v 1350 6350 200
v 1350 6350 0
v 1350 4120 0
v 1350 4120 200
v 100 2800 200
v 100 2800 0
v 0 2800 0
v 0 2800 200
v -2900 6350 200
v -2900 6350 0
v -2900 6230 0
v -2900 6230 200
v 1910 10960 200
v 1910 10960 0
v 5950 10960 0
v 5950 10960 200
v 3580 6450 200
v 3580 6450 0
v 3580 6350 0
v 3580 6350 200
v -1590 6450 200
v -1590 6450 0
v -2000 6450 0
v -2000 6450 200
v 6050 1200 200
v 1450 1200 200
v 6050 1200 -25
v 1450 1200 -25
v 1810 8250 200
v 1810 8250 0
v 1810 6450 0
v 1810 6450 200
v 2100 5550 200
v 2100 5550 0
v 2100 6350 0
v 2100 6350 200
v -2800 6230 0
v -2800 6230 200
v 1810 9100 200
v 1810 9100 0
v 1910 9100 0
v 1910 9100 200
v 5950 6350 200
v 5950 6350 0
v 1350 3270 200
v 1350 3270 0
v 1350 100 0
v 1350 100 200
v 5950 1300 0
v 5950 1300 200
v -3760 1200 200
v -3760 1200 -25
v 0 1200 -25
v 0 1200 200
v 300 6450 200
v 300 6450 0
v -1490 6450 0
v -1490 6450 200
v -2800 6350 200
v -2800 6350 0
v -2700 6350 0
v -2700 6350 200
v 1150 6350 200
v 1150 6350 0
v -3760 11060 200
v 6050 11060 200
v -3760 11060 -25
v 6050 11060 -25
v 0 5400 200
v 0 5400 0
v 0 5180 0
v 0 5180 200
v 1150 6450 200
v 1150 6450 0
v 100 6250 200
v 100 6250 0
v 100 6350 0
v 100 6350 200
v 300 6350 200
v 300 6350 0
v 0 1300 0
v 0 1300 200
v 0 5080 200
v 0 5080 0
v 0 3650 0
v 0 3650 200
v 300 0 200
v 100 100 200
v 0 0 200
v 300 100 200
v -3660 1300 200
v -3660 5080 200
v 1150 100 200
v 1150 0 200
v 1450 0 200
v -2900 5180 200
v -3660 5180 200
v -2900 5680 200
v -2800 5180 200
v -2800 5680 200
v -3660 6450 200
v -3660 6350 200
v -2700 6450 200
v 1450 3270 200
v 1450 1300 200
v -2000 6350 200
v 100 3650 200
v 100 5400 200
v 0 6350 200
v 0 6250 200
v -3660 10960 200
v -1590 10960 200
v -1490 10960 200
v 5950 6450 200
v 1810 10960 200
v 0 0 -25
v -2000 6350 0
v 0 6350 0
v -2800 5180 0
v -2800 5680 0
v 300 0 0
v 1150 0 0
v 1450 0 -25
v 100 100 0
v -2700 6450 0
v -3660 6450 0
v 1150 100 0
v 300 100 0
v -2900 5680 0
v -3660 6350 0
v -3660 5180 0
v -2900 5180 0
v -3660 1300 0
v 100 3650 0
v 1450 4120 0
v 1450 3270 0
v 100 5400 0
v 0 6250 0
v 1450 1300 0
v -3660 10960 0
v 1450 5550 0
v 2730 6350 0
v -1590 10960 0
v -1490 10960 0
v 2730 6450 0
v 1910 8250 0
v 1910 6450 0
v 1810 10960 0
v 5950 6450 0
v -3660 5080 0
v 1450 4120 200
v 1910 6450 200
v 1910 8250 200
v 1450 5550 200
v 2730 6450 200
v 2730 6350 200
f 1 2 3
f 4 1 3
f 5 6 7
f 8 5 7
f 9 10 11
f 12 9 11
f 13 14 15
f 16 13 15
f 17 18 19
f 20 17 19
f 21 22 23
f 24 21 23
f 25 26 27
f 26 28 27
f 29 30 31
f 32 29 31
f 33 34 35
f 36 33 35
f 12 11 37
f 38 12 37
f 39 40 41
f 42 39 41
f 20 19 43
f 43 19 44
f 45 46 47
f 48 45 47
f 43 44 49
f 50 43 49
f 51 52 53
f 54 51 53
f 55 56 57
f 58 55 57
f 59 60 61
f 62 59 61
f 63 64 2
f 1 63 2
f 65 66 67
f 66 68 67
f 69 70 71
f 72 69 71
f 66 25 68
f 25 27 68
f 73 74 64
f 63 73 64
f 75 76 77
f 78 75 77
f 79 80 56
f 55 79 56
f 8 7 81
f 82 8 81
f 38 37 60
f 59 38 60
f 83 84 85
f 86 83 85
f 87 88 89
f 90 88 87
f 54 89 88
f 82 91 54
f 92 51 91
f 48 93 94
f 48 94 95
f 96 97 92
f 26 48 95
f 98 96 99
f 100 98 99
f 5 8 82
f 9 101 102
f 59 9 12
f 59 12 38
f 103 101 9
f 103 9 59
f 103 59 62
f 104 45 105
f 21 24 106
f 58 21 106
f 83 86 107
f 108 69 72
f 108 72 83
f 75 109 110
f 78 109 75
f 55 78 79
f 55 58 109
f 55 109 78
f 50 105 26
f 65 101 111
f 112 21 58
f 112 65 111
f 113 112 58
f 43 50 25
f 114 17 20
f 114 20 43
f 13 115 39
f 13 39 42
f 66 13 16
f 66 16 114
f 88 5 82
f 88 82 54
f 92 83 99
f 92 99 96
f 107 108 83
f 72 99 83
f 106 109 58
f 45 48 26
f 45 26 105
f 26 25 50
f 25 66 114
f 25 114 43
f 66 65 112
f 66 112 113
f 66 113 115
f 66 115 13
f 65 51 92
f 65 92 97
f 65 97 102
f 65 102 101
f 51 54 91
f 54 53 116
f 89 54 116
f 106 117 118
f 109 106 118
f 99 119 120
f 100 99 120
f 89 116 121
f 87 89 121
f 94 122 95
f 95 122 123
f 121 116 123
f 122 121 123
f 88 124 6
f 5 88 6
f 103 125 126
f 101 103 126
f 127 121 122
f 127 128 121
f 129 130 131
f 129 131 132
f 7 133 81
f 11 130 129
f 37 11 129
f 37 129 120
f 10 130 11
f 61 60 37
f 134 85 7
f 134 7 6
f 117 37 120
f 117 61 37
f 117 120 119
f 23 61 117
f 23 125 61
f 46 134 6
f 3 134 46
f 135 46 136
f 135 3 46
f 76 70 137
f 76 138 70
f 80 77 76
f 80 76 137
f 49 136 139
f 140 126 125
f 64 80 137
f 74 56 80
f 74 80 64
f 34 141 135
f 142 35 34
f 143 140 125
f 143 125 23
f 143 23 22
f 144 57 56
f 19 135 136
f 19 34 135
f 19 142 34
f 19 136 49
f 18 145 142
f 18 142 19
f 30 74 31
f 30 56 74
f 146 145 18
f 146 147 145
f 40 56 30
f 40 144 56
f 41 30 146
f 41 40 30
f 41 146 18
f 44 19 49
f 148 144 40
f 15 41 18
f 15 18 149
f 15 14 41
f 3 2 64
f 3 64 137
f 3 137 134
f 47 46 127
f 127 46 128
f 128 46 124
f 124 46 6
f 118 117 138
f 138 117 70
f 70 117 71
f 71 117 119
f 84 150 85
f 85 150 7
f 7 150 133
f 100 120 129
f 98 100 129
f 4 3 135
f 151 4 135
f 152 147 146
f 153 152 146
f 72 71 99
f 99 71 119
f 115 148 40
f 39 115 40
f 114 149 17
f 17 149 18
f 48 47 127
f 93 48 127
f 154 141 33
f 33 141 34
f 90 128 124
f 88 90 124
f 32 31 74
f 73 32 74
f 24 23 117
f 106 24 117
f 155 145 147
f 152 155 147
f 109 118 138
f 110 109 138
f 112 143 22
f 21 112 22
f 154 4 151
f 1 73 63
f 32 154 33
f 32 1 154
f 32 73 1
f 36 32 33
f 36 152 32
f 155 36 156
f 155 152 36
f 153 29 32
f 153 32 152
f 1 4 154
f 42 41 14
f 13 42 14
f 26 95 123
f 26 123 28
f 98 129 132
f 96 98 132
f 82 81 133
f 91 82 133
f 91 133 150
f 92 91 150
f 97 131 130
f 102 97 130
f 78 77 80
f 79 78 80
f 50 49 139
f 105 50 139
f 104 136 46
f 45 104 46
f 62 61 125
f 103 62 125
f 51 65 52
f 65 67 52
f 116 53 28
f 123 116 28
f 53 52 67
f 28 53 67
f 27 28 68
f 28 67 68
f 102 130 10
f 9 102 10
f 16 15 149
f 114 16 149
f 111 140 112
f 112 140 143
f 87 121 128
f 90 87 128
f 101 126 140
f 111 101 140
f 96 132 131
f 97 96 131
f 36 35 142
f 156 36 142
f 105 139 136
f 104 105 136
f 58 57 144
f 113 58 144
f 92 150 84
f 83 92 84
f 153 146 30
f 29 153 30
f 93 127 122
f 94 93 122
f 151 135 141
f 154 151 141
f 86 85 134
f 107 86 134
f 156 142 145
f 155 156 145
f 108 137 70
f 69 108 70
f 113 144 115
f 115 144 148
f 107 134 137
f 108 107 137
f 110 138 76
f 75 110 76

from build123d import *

# Parameters (mm, degrees)
F2_DEPTH = 25
F0_W     = 650
F0_H     = 800
F3_DEPTH = 200


with BuildPart() as f2:
    # F1 (on Top) → F2 (new body)
    with BuildSketch(Plane.XY):
        Polygon((6050, 11060), (-3760, 11060), (-3760, 1200), (0, 1200), (0, 0), (1450, 0), (1450, 1200), (6050, 1200), align=None)
    extrude(amount=-F2_DEPTH)

    # F0 (on Top) → F3 (join)
    with BuildSketch(Plane.XY):
        Polygon((0, 0), (300, 0), (300, 100), (100, 100), (100, 184.210543425), (100, 2800), (0, 2800), (0, 1300), (-3660, 1300), (-3660, 5080), (0, 5080), (0, 3650), (100, 3650), (100, 5400), (0, 5400), (0, 5180), (-2800, 5180), (-2800, 5680), (-2900, 5680), (-2900, 5180), (-3660, 5180), (-3660, 6350), (-2900, 6350), (-2900, 6230), (-2800, 6230), (-2800, 6350), (-2700, 6350), (-2700, 6450), (-3660, 6450), (-3660, 10960), (-1590, 10960), (-1590, 6450), (-2000, 6450), (-2000, 6350), (0, 6350), (0, 6250), (100, 6250), (100, 6350), (300, 6350), (300, 6450), (-1490, 6450), (-1490, 10960), (1810, 10960), (1810, 9100), (1910, 9100), (1910, 10960), (5950, 10960), (5950, 6450), (3580, 6450), (3580, 6350), (5950, 6350), (5950, 1300), (1450, 1300), (1450, 3270), (1350, 3270), (1350, 100), (1150, 100), (1150, 0), (1450, 0), (1450, 1200), (6050, 1200), (6050, 11060), (-3760, 11060), (-3760, 1200), (0, 1200), (0, 184.210543425), align=None)
        Polygon((1150, 6450), (1150, 6350), (1350, 6350), (1350, 4120), (1450, 4120), (1450, 5550), (1450, 6350), (2100, 6350), (2730, 6350), (2730, 6450), (1910, 6450), (1910, 8250), (1810, 8250), (1810, 6450), align=None)
        with Locations((1775, 5950)):
            Rectangle(F0_W, F0_H)
    extrude(amount=F3_DEPTH)


solid = f2.part
